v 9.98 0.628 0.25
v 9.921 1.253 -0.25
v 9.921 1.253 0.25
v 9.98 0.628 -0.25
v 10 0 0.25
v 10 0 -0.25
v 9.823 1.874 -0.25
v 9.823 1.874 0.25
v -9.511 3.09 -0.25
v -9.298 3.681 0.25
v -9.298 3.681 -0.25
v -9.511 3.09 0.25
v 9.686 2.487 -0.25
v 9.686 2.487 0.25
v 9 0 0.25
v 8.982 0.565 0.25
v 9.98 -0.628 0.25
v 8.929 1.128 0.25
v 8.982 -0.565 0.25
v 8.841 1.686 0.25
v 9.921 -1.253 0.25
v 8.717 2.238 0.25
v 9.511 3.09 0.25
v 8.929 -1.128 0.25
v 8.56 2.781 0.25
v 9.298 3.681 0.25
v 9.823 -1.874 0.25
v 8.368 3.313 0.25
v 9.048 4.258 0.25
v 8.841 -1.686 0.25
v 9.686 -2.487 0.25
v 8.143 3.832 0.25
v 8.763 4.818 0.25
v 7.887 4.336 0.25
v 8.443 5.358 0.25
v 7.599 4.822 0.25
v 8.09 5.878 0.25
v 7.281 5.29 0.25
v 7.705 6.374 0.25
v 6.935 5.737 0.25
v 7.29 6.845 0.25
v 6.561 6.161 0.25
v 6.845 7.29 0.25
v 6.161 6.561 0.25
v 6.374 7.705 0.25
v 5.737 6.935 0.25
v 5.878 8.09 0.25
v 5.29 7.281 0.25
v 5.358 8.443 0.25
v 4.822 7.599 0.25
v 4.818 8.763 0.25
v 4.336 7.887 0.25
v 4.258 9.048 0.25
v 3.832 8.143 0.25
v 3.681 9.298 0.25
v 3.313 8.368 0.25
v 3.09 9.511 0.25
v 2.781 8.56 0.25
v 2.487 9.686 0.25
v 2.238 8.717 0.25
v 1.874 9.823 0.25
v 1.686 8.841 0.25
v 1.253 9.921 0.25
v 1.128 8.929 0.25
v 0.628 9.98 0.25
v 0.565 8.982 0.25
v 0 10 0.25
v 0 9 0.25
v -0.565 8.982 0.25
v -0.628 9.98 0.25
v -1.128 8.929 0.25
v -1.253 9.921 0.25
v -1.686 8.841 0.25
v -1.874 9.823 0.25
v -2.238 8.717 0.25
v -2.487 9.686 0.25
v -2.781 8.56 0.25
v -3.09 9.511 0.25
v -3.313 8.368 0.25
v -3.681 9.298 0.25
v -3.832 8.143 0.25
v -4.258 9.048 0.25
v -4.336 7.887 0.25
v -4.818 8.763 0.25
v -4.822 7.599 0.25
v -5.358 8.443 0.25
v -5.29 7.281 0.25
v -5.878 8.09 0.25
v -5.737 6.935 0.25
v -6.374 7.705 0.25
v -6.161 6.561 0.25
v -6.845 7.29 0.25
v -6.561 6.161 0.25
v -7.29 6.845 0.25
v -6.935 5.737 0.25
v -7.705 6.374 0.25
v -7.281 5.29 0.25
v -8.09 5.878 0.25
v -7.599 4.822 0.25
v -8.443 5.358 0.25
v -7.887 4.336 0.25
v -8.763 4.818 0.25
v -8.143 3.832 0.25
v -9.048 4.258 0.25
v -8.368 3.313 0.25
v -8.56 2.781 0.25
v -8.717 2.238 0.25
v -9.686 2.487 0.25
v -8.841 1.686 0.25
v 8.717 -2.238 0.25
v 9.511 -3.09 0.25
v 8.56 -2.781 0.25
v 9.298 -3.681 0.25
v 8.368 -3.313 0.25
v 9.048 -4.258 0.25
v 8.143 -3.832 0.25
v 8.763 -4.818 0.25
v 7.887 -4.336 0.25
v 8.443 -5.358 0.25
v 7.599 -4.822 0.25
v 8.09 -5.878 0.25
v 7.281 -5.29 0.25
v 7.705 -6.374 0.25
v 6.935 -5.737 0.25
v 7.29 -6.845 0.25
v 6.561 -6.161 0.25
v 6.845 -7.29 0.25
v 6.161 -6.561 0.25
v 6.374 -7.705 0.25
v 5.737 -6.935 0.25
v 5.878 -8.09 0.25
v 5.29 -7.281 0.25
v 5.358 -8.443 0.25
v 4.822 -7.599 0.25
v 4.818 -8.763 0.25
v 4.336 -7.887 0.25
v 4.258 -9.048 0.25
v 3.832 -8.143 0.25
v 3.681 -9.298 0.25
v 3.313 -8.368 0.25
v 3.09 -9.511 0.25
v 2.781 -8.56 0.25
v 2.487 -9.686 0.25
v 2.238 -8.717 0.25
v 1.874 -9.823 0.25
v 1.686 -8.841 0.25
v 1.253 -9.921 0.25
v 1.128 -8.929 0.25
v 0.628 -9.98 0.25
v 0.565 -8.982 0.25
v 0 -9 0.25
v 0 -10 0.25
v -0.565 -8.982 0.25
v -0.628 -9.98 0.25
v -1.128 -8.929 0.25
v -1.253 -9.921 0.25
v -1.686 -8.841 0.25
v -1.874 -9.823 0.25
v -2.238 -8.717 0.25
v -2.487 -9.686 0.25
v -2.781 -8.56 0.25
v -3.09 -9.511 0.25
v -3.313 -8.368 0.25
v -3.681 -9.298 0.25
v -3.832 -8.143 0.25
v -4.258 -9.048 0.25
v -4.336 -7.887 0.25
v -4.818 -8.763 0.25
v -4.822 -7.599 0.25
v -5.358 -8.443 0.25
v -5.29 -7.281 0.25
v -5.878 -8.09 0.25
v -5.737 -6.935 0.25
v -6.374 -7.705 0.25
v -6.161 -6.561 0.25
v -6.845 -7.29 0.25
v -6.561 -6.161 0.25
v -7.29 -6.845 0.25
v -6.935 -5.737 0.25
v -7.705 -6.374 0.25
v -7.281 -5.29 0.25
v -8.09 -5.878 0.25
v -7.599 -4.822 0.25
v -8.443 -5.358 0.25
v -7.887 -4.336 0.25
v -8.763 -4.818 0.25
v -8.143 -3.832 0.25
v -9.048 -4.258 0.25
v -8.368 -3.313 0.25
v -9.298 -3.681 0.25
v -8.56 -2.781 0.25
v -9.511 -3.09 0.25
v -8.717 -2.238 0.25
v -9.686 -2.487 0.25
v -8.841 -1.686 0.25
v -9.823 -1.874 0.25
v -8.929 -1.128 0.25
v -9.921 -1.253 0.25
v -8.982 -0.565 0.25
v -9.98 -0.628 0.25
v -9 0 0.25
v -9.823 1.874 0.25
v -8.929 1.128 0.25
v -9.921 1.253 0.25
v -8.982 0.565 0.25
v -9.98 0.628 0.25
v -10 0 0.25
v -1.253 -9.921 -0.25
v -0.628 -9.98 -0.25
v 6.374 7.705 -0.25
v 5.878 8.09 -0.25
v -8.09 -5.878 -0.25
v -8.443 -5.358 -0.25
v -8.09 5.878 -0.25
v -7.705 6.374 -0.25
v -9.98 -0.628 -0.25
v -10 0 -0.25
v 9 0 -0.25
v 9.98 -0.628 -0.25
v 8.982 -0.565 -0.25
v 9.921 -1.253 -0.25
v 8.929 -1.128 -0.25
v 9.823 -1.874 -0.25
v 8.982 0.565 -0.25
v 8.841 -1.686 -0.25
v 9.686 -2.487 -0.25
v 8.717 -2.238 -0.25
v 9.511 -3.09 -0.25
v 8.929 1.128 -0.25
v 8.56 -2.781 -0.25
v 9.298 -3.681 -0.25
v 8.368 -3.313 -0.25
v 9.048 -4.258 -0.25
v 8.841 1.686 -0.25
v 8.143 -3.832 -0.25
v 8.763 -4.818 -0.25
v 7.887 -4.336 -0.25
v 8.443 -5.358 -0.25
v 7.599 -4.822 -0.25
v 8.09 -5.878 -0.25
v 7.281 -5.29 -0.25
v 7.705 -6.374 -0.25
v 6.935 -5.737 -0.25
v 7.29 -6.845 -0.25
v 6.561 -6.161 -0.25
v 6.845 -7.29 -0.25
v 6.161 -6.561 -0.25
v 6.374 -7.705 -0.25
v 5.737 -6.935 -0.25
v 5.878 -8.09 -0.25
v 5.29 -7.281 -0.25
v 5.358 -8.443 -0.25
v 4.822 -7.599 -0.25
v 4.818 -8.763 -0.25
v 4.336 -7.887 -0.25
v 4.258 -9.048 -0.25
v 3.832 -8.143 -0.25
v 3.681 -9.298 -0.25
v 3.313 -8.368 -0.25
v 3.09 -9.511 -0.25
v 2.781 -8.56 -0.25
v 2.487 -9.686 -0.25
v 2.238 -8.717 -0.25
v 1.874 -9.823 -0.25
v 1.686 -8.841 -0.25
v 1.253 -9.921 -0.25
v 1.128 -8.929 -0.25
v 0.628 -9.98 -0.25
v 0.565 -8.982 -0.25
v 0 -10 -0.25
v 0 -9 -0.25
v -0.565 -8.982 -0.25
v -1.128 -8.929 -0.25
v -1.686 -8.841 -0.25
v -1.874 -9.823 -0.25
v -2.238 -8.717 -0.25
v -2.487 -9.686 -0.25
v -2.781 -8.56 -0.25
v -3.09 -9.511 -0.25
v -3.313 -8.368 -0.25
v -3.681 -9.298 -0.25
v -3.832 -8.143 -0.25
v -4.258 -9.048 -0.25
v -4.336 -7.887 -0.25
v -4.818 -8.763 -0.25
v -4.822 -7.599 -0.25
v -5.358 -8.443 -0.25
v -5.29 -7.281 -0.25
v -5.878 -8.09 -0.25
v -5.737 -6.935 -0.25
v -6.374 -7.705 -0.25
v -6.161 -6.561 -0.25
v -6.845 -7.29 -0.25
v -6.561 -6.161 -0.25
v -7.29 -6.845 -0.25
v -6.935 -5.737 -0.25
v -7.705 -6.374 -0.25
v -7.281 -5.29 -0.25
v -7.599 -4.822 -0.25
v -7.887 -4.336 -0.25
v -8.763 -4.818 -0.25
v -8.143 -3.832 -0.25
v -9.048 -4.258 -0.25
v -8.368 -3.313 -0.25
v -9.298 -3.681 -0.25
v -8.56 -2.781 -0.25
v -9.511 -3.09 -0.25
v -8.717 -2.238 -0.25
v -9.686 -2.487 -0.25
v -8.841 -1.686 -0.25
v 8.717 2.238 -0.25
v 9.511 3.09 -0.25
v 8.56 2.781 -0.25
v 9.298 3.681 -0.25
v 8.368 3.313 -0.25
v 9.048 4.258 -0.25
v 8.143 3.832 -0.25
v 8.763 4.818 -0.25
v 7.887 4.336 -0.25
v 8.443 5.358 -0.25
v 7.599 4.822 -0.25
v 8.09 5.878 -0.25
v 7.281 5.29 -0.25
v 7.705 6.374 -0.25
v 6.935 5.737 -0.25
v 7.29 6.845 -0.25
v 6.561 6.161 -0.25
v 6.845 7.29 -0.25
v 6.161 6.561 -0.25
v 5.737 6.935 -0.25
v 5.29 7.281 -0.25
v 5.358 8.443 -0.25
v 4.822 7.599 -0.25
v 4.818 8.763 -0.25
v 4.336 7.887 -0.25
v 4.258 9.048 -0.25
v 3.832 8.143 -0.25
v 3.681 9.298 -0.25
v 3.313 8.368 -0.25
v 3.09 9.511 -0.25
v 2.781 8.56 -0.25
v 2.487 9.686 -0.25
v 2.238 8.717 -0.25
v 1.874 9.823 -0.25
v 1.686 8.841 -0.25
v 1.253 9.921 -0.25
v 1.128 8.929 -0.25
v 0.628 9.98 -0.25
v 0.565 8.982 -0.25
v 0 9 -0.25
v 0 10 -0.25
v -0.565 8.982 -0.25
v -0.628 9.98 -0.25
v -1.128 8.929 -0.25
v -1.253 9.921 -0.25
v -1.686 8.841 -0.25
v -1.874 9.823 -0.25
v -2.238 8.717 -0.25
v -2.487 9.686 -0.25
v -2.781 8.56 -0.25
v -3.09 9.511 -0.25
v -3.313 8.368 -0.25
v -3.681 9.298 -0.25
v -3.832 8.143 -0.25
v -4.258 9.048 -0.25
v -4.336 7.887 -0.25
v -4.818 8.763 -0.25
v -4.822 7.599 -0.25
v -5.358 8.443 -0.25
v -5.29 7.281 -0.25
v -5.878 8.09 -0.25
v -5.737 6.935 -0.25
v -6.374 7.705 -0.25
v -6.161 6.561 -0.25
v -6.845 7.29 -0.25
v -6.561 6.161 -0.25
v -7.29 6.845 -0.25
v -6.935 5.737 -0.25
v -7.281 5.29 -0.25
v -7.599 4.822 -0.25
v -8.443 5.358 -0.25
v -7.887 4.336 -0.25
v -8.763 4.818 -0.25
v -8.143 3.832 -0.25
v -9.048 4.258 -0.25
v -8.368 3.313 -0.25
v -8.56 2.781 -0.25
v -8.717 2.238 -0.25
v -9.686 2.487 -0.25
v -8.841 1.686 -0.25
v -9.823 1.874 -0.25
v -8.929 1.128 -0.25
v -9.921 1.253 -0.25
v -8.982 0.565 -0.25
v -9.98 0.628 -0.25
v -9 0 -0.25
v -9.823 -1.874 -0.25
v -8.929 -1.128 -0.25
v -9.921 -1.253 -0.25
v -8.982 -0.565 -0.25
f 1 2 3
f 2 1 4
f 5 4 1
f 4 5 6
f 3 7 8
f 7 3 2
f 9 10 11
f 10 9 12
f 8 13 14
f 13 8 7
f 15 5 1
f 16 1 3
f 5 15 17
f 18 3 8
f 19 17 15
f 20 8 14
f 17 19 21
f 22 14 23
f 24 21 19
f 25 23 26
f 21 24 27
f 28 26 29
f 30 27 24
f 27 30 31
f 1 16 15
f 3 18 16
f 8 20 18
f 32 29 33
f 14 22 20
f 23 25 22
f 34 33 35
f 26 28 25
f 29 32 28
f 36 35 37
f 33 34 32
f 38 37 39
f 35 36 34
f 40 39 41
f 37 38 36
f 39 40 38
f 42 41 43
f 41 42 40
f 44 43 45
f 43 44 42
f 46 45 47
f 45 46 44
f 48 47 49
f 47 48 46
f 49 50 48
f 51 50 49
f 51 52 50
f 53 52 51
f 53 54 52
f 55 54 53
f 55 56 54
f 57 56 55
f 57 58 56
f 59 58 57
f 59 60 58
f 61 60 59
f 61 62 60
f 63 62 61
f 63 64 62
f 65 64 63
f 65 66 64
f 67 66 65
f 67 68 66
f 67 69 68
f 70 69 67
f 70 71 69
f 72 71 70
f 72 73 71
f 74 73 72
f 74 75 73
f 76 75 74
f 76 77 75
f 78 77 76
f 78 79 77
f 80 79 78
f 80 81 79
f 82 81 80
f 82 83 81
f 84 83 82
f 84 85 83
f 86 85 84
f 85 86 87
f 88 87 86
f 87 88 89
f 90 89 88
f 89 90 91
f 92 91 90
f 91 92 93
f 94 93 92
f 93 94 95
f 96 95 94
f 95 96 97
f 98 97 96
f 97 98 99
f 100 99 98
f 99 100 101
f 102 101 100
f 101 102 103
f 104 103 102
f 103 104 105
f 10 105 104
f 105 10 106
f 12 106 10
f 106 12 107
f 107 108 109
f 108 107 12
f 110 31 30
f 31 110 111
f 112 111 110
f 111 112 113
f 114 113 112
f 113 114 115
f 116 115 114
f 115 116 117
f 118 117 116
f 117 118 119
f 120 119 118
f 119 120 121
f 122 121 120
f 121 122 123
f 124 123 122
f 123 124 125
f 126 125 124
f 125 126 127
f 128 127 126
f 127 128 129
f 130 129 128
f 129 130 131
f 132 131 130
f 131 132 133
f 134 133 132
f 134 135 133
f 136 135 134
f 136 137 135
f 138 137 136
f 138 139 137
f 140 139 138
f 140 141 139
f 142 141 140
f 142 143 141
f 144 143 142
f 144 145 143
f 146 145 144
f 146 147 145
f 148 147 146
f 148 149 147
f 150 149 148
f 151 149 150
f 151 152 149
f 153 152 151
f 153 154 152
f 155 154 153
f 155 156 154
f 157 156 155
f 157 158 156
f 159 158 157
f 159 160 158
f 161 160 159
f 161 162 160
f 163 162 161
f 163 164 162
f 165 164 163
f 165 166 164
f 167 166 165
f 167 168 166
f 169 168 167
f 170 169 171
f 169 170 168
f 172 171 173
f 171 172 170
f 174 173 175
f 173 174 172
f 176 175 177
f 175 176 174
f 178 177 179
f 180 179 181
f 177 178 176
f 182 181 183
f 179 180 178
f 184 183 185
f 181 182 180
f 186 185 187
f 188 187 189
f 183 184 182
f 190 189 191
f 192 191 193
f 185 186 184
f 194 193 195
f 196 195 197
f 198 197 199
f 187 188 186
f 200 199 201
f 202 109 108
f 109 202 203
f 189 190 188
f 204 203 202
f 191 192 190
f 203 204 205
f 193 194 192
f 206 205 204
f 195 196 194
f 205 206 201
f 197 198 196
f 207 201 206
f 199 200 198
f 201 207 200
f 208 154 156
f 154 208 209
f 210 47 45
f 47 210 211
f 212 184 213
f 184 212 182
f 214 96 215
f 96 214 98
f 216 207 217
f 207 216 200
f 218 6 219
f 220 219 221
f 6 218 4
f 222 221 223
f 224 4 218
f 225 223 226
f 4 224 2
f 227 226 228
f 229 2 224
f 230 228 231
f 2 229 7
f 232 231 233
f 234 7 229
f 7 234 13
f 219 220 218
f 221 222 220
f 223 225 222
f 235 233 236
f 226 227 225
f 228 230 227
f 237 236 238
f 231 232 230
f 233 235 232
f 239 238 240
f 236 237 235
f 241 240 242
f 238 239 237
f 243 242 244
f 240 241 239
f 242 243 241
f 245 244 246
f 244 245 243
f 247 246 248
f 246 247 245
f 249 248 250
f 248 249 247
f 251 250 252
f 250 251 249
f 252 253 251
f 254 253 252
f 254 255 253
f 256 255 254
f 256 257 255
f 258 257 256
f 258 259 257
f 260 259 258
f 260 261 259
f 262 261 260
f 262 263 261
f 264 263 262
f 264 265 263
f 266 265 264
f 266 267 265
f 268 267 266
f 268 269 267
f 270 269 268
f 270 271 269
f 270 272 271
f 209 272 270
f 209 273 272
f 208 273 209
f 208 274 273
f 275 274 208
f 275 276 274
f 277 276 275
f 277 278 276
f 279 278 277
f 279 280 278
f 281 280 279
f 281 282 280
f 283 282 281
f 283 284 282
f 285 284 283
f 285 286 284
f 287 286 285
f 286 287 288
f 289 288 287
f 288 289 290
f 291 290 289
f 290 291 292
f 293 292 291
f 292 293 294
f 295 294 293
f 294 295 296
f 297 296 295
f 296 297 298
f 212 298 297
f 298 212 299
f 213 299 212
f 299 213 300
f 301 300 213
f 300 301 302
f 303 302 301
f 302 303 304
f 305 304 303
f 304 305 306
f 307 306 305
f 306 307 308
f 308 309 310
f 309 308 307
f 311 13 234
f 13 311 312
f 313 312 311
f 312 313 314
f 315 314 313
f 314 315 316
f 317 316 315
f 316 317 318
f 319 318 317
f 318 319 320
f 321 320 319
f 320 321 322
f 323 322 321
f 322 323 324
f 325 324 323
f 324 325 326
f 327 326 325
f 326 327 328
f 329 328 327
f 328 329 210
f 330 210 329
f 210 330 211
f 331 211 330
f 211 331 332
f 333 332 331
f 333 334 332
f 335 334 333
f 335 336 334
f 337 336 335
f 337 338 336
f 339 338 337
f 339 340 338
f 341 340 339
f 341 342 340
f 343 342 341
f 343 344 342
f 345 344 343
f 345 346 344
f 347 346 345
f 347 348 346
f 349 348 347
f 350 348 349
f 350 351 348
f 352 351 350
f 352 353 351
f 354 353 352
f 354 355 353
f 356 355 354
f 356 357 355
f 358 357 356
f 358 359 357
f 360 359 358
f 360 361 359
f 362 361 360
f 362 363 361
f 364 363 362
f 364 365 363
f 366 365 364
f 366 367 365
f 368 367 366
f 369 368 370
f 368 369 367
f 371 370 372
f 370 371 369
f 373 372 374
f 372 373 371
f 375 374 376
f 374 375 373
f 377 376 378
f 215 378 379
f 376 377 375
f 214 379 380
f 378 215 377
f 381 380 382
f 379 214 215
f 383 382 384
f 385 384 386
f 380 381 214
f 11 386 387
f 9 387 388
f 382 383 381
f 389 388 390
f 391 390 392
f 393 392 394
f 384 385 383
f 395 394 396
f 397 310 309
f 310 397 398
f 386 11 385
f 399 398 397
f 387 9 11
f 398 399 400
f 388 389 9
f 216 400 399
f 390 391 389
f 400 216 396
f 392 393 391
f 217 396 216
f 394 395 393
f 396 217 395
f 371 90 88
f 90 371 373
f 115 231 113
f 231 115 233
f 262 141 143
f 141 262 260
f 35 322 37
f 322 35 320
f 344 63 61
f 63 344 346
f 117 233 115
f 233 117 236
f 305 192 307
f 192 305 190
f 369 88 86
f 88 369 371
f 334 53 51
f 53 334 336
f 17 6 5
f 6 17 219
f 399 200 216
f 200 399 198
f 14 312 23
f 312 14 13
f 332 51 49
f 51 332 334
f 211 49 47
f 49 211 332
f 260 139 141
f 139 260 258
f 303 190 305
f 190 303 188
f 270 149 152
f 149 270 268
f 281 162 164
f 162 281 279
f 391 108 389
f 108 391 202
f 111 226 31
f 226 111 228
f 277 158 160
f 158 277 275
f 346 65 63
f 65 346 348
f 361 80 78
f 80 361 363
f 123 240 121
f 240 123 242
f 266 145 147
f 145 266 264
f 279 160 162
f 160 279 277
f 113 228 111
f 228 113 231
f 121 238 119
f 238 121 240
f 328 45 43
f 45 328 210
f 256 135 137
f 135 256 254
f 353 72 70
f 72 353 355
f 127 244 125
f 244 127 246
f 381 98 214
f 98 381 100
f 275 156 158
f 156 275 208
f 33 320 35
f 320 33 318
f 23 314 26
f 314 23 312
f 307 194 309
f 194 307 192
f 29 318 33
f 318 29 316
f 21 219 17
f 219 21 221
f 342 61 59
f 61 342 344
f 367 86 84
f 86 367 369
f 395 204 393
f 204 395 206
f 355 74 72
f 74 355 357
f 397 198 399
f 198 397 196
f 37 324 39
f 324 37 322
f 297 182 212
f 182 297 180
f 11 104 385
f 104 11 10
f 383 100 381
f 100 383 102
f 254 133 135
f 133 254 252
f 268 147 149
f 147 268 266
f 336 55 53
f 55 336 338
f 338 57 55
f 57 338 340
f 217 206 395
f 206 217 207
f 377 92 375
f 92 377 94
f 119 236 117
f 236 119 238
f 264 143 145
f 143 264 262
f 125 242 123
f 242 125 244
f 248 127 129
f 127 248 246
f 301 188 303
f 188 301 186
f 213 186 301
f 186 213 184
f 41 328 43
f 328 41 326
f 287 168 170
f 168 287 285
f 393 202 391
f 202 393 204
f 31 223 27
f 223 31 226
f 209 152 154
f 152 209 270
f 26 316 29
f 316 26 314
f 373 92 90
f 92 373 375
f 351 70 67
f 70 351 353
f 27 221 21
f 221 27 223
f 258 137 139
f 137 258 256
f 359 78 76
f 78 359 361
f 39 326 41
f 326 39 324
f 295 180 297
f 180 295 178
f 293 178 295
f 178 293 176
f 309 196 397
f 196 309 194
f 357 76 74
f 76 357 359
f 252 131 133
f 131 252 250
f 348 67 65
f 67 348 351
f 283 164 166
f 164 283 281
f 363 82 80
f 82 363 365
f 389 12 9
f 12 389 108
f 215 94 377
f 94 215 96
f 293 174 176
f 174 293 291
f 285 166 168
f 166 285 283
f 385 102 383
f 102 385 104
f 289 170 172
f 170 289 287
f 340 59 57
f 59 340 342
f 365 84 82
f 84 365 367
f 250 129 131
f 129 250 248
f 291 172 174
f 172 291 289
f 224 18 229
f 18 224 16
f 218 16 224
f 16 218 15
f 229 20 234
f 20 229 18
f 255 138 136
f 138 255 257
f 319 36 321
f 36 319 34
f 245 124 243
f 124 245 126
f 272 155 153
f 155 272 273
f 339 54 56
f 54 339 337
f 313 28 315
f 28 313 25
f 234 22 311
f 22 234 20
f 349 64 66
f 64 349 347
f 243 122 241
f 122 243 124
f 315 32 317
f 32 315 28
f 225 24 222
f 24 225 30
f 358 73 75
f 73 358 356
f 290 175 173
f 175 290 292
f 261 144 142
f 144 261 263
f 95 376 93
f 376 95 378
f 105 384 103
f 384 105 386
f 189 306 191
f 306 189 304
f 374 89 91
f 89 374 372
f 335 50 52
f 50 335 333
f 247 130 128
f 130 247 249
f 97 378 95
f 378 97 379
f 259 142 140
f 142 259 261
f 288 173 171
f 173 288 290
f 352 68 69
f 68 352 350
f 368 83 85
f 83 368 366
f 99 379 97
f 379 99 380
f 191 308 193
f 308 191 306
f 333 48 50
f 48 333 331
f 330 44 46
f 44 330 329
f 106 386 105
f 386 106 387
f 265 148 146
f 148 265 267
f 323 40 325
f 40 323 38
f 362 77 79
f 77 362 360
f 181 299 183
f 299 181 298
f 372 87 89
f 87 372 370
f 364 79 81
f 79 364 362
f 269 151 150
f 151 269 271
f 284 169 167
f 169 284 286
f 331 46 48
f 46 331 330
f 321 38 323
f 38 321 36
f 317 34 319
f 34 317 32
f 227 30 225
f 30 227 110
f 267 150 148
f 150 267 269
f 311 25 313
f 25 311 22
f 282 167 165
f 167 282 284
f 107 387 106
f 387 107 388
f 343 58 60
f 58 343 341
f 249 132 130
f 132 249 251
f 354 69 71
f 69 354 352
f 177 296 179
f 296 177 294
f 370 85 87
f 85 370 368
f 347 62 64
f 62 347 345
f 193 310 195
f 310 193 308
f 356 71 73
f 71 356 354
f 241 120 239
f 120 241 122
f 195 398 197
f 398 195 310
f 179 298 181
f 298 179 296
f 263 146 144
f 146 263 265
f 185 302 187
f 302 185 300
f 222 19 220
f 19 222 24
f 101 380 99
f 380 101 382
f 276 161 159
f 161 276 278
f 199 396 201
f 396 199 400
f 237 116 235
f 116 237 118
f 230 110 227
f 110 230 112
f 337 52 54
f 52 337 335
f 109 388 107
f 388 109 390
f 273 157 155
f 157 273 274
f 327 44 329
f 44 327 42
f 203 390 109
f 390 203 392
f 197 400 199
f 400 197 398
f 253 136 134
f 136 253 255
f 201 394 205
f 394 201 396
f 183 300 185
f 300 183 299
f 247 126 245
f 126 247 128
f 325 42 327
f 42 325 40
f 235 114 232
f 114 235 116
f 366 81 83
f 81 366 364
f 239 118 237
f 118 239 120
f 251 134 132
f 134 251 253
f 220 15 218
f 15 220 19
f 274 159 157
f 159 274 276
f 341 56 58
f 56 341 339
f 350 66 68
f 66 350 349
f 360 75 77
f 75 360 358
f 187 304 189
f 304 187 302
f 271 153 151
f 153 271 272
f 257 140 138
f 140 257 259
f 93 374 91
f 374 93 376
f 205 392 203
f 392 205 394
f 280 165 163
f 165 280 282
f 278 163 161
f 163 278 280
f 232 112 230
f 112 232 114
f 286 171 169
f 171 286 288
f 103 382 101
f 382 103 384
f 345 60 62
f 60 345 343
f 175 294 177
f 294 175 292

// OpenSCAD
$fn=100;
difference(){
    cylinder(r=10, h=0.5, center=true);
    cylinder(r=9, h=100, center=true);
}
